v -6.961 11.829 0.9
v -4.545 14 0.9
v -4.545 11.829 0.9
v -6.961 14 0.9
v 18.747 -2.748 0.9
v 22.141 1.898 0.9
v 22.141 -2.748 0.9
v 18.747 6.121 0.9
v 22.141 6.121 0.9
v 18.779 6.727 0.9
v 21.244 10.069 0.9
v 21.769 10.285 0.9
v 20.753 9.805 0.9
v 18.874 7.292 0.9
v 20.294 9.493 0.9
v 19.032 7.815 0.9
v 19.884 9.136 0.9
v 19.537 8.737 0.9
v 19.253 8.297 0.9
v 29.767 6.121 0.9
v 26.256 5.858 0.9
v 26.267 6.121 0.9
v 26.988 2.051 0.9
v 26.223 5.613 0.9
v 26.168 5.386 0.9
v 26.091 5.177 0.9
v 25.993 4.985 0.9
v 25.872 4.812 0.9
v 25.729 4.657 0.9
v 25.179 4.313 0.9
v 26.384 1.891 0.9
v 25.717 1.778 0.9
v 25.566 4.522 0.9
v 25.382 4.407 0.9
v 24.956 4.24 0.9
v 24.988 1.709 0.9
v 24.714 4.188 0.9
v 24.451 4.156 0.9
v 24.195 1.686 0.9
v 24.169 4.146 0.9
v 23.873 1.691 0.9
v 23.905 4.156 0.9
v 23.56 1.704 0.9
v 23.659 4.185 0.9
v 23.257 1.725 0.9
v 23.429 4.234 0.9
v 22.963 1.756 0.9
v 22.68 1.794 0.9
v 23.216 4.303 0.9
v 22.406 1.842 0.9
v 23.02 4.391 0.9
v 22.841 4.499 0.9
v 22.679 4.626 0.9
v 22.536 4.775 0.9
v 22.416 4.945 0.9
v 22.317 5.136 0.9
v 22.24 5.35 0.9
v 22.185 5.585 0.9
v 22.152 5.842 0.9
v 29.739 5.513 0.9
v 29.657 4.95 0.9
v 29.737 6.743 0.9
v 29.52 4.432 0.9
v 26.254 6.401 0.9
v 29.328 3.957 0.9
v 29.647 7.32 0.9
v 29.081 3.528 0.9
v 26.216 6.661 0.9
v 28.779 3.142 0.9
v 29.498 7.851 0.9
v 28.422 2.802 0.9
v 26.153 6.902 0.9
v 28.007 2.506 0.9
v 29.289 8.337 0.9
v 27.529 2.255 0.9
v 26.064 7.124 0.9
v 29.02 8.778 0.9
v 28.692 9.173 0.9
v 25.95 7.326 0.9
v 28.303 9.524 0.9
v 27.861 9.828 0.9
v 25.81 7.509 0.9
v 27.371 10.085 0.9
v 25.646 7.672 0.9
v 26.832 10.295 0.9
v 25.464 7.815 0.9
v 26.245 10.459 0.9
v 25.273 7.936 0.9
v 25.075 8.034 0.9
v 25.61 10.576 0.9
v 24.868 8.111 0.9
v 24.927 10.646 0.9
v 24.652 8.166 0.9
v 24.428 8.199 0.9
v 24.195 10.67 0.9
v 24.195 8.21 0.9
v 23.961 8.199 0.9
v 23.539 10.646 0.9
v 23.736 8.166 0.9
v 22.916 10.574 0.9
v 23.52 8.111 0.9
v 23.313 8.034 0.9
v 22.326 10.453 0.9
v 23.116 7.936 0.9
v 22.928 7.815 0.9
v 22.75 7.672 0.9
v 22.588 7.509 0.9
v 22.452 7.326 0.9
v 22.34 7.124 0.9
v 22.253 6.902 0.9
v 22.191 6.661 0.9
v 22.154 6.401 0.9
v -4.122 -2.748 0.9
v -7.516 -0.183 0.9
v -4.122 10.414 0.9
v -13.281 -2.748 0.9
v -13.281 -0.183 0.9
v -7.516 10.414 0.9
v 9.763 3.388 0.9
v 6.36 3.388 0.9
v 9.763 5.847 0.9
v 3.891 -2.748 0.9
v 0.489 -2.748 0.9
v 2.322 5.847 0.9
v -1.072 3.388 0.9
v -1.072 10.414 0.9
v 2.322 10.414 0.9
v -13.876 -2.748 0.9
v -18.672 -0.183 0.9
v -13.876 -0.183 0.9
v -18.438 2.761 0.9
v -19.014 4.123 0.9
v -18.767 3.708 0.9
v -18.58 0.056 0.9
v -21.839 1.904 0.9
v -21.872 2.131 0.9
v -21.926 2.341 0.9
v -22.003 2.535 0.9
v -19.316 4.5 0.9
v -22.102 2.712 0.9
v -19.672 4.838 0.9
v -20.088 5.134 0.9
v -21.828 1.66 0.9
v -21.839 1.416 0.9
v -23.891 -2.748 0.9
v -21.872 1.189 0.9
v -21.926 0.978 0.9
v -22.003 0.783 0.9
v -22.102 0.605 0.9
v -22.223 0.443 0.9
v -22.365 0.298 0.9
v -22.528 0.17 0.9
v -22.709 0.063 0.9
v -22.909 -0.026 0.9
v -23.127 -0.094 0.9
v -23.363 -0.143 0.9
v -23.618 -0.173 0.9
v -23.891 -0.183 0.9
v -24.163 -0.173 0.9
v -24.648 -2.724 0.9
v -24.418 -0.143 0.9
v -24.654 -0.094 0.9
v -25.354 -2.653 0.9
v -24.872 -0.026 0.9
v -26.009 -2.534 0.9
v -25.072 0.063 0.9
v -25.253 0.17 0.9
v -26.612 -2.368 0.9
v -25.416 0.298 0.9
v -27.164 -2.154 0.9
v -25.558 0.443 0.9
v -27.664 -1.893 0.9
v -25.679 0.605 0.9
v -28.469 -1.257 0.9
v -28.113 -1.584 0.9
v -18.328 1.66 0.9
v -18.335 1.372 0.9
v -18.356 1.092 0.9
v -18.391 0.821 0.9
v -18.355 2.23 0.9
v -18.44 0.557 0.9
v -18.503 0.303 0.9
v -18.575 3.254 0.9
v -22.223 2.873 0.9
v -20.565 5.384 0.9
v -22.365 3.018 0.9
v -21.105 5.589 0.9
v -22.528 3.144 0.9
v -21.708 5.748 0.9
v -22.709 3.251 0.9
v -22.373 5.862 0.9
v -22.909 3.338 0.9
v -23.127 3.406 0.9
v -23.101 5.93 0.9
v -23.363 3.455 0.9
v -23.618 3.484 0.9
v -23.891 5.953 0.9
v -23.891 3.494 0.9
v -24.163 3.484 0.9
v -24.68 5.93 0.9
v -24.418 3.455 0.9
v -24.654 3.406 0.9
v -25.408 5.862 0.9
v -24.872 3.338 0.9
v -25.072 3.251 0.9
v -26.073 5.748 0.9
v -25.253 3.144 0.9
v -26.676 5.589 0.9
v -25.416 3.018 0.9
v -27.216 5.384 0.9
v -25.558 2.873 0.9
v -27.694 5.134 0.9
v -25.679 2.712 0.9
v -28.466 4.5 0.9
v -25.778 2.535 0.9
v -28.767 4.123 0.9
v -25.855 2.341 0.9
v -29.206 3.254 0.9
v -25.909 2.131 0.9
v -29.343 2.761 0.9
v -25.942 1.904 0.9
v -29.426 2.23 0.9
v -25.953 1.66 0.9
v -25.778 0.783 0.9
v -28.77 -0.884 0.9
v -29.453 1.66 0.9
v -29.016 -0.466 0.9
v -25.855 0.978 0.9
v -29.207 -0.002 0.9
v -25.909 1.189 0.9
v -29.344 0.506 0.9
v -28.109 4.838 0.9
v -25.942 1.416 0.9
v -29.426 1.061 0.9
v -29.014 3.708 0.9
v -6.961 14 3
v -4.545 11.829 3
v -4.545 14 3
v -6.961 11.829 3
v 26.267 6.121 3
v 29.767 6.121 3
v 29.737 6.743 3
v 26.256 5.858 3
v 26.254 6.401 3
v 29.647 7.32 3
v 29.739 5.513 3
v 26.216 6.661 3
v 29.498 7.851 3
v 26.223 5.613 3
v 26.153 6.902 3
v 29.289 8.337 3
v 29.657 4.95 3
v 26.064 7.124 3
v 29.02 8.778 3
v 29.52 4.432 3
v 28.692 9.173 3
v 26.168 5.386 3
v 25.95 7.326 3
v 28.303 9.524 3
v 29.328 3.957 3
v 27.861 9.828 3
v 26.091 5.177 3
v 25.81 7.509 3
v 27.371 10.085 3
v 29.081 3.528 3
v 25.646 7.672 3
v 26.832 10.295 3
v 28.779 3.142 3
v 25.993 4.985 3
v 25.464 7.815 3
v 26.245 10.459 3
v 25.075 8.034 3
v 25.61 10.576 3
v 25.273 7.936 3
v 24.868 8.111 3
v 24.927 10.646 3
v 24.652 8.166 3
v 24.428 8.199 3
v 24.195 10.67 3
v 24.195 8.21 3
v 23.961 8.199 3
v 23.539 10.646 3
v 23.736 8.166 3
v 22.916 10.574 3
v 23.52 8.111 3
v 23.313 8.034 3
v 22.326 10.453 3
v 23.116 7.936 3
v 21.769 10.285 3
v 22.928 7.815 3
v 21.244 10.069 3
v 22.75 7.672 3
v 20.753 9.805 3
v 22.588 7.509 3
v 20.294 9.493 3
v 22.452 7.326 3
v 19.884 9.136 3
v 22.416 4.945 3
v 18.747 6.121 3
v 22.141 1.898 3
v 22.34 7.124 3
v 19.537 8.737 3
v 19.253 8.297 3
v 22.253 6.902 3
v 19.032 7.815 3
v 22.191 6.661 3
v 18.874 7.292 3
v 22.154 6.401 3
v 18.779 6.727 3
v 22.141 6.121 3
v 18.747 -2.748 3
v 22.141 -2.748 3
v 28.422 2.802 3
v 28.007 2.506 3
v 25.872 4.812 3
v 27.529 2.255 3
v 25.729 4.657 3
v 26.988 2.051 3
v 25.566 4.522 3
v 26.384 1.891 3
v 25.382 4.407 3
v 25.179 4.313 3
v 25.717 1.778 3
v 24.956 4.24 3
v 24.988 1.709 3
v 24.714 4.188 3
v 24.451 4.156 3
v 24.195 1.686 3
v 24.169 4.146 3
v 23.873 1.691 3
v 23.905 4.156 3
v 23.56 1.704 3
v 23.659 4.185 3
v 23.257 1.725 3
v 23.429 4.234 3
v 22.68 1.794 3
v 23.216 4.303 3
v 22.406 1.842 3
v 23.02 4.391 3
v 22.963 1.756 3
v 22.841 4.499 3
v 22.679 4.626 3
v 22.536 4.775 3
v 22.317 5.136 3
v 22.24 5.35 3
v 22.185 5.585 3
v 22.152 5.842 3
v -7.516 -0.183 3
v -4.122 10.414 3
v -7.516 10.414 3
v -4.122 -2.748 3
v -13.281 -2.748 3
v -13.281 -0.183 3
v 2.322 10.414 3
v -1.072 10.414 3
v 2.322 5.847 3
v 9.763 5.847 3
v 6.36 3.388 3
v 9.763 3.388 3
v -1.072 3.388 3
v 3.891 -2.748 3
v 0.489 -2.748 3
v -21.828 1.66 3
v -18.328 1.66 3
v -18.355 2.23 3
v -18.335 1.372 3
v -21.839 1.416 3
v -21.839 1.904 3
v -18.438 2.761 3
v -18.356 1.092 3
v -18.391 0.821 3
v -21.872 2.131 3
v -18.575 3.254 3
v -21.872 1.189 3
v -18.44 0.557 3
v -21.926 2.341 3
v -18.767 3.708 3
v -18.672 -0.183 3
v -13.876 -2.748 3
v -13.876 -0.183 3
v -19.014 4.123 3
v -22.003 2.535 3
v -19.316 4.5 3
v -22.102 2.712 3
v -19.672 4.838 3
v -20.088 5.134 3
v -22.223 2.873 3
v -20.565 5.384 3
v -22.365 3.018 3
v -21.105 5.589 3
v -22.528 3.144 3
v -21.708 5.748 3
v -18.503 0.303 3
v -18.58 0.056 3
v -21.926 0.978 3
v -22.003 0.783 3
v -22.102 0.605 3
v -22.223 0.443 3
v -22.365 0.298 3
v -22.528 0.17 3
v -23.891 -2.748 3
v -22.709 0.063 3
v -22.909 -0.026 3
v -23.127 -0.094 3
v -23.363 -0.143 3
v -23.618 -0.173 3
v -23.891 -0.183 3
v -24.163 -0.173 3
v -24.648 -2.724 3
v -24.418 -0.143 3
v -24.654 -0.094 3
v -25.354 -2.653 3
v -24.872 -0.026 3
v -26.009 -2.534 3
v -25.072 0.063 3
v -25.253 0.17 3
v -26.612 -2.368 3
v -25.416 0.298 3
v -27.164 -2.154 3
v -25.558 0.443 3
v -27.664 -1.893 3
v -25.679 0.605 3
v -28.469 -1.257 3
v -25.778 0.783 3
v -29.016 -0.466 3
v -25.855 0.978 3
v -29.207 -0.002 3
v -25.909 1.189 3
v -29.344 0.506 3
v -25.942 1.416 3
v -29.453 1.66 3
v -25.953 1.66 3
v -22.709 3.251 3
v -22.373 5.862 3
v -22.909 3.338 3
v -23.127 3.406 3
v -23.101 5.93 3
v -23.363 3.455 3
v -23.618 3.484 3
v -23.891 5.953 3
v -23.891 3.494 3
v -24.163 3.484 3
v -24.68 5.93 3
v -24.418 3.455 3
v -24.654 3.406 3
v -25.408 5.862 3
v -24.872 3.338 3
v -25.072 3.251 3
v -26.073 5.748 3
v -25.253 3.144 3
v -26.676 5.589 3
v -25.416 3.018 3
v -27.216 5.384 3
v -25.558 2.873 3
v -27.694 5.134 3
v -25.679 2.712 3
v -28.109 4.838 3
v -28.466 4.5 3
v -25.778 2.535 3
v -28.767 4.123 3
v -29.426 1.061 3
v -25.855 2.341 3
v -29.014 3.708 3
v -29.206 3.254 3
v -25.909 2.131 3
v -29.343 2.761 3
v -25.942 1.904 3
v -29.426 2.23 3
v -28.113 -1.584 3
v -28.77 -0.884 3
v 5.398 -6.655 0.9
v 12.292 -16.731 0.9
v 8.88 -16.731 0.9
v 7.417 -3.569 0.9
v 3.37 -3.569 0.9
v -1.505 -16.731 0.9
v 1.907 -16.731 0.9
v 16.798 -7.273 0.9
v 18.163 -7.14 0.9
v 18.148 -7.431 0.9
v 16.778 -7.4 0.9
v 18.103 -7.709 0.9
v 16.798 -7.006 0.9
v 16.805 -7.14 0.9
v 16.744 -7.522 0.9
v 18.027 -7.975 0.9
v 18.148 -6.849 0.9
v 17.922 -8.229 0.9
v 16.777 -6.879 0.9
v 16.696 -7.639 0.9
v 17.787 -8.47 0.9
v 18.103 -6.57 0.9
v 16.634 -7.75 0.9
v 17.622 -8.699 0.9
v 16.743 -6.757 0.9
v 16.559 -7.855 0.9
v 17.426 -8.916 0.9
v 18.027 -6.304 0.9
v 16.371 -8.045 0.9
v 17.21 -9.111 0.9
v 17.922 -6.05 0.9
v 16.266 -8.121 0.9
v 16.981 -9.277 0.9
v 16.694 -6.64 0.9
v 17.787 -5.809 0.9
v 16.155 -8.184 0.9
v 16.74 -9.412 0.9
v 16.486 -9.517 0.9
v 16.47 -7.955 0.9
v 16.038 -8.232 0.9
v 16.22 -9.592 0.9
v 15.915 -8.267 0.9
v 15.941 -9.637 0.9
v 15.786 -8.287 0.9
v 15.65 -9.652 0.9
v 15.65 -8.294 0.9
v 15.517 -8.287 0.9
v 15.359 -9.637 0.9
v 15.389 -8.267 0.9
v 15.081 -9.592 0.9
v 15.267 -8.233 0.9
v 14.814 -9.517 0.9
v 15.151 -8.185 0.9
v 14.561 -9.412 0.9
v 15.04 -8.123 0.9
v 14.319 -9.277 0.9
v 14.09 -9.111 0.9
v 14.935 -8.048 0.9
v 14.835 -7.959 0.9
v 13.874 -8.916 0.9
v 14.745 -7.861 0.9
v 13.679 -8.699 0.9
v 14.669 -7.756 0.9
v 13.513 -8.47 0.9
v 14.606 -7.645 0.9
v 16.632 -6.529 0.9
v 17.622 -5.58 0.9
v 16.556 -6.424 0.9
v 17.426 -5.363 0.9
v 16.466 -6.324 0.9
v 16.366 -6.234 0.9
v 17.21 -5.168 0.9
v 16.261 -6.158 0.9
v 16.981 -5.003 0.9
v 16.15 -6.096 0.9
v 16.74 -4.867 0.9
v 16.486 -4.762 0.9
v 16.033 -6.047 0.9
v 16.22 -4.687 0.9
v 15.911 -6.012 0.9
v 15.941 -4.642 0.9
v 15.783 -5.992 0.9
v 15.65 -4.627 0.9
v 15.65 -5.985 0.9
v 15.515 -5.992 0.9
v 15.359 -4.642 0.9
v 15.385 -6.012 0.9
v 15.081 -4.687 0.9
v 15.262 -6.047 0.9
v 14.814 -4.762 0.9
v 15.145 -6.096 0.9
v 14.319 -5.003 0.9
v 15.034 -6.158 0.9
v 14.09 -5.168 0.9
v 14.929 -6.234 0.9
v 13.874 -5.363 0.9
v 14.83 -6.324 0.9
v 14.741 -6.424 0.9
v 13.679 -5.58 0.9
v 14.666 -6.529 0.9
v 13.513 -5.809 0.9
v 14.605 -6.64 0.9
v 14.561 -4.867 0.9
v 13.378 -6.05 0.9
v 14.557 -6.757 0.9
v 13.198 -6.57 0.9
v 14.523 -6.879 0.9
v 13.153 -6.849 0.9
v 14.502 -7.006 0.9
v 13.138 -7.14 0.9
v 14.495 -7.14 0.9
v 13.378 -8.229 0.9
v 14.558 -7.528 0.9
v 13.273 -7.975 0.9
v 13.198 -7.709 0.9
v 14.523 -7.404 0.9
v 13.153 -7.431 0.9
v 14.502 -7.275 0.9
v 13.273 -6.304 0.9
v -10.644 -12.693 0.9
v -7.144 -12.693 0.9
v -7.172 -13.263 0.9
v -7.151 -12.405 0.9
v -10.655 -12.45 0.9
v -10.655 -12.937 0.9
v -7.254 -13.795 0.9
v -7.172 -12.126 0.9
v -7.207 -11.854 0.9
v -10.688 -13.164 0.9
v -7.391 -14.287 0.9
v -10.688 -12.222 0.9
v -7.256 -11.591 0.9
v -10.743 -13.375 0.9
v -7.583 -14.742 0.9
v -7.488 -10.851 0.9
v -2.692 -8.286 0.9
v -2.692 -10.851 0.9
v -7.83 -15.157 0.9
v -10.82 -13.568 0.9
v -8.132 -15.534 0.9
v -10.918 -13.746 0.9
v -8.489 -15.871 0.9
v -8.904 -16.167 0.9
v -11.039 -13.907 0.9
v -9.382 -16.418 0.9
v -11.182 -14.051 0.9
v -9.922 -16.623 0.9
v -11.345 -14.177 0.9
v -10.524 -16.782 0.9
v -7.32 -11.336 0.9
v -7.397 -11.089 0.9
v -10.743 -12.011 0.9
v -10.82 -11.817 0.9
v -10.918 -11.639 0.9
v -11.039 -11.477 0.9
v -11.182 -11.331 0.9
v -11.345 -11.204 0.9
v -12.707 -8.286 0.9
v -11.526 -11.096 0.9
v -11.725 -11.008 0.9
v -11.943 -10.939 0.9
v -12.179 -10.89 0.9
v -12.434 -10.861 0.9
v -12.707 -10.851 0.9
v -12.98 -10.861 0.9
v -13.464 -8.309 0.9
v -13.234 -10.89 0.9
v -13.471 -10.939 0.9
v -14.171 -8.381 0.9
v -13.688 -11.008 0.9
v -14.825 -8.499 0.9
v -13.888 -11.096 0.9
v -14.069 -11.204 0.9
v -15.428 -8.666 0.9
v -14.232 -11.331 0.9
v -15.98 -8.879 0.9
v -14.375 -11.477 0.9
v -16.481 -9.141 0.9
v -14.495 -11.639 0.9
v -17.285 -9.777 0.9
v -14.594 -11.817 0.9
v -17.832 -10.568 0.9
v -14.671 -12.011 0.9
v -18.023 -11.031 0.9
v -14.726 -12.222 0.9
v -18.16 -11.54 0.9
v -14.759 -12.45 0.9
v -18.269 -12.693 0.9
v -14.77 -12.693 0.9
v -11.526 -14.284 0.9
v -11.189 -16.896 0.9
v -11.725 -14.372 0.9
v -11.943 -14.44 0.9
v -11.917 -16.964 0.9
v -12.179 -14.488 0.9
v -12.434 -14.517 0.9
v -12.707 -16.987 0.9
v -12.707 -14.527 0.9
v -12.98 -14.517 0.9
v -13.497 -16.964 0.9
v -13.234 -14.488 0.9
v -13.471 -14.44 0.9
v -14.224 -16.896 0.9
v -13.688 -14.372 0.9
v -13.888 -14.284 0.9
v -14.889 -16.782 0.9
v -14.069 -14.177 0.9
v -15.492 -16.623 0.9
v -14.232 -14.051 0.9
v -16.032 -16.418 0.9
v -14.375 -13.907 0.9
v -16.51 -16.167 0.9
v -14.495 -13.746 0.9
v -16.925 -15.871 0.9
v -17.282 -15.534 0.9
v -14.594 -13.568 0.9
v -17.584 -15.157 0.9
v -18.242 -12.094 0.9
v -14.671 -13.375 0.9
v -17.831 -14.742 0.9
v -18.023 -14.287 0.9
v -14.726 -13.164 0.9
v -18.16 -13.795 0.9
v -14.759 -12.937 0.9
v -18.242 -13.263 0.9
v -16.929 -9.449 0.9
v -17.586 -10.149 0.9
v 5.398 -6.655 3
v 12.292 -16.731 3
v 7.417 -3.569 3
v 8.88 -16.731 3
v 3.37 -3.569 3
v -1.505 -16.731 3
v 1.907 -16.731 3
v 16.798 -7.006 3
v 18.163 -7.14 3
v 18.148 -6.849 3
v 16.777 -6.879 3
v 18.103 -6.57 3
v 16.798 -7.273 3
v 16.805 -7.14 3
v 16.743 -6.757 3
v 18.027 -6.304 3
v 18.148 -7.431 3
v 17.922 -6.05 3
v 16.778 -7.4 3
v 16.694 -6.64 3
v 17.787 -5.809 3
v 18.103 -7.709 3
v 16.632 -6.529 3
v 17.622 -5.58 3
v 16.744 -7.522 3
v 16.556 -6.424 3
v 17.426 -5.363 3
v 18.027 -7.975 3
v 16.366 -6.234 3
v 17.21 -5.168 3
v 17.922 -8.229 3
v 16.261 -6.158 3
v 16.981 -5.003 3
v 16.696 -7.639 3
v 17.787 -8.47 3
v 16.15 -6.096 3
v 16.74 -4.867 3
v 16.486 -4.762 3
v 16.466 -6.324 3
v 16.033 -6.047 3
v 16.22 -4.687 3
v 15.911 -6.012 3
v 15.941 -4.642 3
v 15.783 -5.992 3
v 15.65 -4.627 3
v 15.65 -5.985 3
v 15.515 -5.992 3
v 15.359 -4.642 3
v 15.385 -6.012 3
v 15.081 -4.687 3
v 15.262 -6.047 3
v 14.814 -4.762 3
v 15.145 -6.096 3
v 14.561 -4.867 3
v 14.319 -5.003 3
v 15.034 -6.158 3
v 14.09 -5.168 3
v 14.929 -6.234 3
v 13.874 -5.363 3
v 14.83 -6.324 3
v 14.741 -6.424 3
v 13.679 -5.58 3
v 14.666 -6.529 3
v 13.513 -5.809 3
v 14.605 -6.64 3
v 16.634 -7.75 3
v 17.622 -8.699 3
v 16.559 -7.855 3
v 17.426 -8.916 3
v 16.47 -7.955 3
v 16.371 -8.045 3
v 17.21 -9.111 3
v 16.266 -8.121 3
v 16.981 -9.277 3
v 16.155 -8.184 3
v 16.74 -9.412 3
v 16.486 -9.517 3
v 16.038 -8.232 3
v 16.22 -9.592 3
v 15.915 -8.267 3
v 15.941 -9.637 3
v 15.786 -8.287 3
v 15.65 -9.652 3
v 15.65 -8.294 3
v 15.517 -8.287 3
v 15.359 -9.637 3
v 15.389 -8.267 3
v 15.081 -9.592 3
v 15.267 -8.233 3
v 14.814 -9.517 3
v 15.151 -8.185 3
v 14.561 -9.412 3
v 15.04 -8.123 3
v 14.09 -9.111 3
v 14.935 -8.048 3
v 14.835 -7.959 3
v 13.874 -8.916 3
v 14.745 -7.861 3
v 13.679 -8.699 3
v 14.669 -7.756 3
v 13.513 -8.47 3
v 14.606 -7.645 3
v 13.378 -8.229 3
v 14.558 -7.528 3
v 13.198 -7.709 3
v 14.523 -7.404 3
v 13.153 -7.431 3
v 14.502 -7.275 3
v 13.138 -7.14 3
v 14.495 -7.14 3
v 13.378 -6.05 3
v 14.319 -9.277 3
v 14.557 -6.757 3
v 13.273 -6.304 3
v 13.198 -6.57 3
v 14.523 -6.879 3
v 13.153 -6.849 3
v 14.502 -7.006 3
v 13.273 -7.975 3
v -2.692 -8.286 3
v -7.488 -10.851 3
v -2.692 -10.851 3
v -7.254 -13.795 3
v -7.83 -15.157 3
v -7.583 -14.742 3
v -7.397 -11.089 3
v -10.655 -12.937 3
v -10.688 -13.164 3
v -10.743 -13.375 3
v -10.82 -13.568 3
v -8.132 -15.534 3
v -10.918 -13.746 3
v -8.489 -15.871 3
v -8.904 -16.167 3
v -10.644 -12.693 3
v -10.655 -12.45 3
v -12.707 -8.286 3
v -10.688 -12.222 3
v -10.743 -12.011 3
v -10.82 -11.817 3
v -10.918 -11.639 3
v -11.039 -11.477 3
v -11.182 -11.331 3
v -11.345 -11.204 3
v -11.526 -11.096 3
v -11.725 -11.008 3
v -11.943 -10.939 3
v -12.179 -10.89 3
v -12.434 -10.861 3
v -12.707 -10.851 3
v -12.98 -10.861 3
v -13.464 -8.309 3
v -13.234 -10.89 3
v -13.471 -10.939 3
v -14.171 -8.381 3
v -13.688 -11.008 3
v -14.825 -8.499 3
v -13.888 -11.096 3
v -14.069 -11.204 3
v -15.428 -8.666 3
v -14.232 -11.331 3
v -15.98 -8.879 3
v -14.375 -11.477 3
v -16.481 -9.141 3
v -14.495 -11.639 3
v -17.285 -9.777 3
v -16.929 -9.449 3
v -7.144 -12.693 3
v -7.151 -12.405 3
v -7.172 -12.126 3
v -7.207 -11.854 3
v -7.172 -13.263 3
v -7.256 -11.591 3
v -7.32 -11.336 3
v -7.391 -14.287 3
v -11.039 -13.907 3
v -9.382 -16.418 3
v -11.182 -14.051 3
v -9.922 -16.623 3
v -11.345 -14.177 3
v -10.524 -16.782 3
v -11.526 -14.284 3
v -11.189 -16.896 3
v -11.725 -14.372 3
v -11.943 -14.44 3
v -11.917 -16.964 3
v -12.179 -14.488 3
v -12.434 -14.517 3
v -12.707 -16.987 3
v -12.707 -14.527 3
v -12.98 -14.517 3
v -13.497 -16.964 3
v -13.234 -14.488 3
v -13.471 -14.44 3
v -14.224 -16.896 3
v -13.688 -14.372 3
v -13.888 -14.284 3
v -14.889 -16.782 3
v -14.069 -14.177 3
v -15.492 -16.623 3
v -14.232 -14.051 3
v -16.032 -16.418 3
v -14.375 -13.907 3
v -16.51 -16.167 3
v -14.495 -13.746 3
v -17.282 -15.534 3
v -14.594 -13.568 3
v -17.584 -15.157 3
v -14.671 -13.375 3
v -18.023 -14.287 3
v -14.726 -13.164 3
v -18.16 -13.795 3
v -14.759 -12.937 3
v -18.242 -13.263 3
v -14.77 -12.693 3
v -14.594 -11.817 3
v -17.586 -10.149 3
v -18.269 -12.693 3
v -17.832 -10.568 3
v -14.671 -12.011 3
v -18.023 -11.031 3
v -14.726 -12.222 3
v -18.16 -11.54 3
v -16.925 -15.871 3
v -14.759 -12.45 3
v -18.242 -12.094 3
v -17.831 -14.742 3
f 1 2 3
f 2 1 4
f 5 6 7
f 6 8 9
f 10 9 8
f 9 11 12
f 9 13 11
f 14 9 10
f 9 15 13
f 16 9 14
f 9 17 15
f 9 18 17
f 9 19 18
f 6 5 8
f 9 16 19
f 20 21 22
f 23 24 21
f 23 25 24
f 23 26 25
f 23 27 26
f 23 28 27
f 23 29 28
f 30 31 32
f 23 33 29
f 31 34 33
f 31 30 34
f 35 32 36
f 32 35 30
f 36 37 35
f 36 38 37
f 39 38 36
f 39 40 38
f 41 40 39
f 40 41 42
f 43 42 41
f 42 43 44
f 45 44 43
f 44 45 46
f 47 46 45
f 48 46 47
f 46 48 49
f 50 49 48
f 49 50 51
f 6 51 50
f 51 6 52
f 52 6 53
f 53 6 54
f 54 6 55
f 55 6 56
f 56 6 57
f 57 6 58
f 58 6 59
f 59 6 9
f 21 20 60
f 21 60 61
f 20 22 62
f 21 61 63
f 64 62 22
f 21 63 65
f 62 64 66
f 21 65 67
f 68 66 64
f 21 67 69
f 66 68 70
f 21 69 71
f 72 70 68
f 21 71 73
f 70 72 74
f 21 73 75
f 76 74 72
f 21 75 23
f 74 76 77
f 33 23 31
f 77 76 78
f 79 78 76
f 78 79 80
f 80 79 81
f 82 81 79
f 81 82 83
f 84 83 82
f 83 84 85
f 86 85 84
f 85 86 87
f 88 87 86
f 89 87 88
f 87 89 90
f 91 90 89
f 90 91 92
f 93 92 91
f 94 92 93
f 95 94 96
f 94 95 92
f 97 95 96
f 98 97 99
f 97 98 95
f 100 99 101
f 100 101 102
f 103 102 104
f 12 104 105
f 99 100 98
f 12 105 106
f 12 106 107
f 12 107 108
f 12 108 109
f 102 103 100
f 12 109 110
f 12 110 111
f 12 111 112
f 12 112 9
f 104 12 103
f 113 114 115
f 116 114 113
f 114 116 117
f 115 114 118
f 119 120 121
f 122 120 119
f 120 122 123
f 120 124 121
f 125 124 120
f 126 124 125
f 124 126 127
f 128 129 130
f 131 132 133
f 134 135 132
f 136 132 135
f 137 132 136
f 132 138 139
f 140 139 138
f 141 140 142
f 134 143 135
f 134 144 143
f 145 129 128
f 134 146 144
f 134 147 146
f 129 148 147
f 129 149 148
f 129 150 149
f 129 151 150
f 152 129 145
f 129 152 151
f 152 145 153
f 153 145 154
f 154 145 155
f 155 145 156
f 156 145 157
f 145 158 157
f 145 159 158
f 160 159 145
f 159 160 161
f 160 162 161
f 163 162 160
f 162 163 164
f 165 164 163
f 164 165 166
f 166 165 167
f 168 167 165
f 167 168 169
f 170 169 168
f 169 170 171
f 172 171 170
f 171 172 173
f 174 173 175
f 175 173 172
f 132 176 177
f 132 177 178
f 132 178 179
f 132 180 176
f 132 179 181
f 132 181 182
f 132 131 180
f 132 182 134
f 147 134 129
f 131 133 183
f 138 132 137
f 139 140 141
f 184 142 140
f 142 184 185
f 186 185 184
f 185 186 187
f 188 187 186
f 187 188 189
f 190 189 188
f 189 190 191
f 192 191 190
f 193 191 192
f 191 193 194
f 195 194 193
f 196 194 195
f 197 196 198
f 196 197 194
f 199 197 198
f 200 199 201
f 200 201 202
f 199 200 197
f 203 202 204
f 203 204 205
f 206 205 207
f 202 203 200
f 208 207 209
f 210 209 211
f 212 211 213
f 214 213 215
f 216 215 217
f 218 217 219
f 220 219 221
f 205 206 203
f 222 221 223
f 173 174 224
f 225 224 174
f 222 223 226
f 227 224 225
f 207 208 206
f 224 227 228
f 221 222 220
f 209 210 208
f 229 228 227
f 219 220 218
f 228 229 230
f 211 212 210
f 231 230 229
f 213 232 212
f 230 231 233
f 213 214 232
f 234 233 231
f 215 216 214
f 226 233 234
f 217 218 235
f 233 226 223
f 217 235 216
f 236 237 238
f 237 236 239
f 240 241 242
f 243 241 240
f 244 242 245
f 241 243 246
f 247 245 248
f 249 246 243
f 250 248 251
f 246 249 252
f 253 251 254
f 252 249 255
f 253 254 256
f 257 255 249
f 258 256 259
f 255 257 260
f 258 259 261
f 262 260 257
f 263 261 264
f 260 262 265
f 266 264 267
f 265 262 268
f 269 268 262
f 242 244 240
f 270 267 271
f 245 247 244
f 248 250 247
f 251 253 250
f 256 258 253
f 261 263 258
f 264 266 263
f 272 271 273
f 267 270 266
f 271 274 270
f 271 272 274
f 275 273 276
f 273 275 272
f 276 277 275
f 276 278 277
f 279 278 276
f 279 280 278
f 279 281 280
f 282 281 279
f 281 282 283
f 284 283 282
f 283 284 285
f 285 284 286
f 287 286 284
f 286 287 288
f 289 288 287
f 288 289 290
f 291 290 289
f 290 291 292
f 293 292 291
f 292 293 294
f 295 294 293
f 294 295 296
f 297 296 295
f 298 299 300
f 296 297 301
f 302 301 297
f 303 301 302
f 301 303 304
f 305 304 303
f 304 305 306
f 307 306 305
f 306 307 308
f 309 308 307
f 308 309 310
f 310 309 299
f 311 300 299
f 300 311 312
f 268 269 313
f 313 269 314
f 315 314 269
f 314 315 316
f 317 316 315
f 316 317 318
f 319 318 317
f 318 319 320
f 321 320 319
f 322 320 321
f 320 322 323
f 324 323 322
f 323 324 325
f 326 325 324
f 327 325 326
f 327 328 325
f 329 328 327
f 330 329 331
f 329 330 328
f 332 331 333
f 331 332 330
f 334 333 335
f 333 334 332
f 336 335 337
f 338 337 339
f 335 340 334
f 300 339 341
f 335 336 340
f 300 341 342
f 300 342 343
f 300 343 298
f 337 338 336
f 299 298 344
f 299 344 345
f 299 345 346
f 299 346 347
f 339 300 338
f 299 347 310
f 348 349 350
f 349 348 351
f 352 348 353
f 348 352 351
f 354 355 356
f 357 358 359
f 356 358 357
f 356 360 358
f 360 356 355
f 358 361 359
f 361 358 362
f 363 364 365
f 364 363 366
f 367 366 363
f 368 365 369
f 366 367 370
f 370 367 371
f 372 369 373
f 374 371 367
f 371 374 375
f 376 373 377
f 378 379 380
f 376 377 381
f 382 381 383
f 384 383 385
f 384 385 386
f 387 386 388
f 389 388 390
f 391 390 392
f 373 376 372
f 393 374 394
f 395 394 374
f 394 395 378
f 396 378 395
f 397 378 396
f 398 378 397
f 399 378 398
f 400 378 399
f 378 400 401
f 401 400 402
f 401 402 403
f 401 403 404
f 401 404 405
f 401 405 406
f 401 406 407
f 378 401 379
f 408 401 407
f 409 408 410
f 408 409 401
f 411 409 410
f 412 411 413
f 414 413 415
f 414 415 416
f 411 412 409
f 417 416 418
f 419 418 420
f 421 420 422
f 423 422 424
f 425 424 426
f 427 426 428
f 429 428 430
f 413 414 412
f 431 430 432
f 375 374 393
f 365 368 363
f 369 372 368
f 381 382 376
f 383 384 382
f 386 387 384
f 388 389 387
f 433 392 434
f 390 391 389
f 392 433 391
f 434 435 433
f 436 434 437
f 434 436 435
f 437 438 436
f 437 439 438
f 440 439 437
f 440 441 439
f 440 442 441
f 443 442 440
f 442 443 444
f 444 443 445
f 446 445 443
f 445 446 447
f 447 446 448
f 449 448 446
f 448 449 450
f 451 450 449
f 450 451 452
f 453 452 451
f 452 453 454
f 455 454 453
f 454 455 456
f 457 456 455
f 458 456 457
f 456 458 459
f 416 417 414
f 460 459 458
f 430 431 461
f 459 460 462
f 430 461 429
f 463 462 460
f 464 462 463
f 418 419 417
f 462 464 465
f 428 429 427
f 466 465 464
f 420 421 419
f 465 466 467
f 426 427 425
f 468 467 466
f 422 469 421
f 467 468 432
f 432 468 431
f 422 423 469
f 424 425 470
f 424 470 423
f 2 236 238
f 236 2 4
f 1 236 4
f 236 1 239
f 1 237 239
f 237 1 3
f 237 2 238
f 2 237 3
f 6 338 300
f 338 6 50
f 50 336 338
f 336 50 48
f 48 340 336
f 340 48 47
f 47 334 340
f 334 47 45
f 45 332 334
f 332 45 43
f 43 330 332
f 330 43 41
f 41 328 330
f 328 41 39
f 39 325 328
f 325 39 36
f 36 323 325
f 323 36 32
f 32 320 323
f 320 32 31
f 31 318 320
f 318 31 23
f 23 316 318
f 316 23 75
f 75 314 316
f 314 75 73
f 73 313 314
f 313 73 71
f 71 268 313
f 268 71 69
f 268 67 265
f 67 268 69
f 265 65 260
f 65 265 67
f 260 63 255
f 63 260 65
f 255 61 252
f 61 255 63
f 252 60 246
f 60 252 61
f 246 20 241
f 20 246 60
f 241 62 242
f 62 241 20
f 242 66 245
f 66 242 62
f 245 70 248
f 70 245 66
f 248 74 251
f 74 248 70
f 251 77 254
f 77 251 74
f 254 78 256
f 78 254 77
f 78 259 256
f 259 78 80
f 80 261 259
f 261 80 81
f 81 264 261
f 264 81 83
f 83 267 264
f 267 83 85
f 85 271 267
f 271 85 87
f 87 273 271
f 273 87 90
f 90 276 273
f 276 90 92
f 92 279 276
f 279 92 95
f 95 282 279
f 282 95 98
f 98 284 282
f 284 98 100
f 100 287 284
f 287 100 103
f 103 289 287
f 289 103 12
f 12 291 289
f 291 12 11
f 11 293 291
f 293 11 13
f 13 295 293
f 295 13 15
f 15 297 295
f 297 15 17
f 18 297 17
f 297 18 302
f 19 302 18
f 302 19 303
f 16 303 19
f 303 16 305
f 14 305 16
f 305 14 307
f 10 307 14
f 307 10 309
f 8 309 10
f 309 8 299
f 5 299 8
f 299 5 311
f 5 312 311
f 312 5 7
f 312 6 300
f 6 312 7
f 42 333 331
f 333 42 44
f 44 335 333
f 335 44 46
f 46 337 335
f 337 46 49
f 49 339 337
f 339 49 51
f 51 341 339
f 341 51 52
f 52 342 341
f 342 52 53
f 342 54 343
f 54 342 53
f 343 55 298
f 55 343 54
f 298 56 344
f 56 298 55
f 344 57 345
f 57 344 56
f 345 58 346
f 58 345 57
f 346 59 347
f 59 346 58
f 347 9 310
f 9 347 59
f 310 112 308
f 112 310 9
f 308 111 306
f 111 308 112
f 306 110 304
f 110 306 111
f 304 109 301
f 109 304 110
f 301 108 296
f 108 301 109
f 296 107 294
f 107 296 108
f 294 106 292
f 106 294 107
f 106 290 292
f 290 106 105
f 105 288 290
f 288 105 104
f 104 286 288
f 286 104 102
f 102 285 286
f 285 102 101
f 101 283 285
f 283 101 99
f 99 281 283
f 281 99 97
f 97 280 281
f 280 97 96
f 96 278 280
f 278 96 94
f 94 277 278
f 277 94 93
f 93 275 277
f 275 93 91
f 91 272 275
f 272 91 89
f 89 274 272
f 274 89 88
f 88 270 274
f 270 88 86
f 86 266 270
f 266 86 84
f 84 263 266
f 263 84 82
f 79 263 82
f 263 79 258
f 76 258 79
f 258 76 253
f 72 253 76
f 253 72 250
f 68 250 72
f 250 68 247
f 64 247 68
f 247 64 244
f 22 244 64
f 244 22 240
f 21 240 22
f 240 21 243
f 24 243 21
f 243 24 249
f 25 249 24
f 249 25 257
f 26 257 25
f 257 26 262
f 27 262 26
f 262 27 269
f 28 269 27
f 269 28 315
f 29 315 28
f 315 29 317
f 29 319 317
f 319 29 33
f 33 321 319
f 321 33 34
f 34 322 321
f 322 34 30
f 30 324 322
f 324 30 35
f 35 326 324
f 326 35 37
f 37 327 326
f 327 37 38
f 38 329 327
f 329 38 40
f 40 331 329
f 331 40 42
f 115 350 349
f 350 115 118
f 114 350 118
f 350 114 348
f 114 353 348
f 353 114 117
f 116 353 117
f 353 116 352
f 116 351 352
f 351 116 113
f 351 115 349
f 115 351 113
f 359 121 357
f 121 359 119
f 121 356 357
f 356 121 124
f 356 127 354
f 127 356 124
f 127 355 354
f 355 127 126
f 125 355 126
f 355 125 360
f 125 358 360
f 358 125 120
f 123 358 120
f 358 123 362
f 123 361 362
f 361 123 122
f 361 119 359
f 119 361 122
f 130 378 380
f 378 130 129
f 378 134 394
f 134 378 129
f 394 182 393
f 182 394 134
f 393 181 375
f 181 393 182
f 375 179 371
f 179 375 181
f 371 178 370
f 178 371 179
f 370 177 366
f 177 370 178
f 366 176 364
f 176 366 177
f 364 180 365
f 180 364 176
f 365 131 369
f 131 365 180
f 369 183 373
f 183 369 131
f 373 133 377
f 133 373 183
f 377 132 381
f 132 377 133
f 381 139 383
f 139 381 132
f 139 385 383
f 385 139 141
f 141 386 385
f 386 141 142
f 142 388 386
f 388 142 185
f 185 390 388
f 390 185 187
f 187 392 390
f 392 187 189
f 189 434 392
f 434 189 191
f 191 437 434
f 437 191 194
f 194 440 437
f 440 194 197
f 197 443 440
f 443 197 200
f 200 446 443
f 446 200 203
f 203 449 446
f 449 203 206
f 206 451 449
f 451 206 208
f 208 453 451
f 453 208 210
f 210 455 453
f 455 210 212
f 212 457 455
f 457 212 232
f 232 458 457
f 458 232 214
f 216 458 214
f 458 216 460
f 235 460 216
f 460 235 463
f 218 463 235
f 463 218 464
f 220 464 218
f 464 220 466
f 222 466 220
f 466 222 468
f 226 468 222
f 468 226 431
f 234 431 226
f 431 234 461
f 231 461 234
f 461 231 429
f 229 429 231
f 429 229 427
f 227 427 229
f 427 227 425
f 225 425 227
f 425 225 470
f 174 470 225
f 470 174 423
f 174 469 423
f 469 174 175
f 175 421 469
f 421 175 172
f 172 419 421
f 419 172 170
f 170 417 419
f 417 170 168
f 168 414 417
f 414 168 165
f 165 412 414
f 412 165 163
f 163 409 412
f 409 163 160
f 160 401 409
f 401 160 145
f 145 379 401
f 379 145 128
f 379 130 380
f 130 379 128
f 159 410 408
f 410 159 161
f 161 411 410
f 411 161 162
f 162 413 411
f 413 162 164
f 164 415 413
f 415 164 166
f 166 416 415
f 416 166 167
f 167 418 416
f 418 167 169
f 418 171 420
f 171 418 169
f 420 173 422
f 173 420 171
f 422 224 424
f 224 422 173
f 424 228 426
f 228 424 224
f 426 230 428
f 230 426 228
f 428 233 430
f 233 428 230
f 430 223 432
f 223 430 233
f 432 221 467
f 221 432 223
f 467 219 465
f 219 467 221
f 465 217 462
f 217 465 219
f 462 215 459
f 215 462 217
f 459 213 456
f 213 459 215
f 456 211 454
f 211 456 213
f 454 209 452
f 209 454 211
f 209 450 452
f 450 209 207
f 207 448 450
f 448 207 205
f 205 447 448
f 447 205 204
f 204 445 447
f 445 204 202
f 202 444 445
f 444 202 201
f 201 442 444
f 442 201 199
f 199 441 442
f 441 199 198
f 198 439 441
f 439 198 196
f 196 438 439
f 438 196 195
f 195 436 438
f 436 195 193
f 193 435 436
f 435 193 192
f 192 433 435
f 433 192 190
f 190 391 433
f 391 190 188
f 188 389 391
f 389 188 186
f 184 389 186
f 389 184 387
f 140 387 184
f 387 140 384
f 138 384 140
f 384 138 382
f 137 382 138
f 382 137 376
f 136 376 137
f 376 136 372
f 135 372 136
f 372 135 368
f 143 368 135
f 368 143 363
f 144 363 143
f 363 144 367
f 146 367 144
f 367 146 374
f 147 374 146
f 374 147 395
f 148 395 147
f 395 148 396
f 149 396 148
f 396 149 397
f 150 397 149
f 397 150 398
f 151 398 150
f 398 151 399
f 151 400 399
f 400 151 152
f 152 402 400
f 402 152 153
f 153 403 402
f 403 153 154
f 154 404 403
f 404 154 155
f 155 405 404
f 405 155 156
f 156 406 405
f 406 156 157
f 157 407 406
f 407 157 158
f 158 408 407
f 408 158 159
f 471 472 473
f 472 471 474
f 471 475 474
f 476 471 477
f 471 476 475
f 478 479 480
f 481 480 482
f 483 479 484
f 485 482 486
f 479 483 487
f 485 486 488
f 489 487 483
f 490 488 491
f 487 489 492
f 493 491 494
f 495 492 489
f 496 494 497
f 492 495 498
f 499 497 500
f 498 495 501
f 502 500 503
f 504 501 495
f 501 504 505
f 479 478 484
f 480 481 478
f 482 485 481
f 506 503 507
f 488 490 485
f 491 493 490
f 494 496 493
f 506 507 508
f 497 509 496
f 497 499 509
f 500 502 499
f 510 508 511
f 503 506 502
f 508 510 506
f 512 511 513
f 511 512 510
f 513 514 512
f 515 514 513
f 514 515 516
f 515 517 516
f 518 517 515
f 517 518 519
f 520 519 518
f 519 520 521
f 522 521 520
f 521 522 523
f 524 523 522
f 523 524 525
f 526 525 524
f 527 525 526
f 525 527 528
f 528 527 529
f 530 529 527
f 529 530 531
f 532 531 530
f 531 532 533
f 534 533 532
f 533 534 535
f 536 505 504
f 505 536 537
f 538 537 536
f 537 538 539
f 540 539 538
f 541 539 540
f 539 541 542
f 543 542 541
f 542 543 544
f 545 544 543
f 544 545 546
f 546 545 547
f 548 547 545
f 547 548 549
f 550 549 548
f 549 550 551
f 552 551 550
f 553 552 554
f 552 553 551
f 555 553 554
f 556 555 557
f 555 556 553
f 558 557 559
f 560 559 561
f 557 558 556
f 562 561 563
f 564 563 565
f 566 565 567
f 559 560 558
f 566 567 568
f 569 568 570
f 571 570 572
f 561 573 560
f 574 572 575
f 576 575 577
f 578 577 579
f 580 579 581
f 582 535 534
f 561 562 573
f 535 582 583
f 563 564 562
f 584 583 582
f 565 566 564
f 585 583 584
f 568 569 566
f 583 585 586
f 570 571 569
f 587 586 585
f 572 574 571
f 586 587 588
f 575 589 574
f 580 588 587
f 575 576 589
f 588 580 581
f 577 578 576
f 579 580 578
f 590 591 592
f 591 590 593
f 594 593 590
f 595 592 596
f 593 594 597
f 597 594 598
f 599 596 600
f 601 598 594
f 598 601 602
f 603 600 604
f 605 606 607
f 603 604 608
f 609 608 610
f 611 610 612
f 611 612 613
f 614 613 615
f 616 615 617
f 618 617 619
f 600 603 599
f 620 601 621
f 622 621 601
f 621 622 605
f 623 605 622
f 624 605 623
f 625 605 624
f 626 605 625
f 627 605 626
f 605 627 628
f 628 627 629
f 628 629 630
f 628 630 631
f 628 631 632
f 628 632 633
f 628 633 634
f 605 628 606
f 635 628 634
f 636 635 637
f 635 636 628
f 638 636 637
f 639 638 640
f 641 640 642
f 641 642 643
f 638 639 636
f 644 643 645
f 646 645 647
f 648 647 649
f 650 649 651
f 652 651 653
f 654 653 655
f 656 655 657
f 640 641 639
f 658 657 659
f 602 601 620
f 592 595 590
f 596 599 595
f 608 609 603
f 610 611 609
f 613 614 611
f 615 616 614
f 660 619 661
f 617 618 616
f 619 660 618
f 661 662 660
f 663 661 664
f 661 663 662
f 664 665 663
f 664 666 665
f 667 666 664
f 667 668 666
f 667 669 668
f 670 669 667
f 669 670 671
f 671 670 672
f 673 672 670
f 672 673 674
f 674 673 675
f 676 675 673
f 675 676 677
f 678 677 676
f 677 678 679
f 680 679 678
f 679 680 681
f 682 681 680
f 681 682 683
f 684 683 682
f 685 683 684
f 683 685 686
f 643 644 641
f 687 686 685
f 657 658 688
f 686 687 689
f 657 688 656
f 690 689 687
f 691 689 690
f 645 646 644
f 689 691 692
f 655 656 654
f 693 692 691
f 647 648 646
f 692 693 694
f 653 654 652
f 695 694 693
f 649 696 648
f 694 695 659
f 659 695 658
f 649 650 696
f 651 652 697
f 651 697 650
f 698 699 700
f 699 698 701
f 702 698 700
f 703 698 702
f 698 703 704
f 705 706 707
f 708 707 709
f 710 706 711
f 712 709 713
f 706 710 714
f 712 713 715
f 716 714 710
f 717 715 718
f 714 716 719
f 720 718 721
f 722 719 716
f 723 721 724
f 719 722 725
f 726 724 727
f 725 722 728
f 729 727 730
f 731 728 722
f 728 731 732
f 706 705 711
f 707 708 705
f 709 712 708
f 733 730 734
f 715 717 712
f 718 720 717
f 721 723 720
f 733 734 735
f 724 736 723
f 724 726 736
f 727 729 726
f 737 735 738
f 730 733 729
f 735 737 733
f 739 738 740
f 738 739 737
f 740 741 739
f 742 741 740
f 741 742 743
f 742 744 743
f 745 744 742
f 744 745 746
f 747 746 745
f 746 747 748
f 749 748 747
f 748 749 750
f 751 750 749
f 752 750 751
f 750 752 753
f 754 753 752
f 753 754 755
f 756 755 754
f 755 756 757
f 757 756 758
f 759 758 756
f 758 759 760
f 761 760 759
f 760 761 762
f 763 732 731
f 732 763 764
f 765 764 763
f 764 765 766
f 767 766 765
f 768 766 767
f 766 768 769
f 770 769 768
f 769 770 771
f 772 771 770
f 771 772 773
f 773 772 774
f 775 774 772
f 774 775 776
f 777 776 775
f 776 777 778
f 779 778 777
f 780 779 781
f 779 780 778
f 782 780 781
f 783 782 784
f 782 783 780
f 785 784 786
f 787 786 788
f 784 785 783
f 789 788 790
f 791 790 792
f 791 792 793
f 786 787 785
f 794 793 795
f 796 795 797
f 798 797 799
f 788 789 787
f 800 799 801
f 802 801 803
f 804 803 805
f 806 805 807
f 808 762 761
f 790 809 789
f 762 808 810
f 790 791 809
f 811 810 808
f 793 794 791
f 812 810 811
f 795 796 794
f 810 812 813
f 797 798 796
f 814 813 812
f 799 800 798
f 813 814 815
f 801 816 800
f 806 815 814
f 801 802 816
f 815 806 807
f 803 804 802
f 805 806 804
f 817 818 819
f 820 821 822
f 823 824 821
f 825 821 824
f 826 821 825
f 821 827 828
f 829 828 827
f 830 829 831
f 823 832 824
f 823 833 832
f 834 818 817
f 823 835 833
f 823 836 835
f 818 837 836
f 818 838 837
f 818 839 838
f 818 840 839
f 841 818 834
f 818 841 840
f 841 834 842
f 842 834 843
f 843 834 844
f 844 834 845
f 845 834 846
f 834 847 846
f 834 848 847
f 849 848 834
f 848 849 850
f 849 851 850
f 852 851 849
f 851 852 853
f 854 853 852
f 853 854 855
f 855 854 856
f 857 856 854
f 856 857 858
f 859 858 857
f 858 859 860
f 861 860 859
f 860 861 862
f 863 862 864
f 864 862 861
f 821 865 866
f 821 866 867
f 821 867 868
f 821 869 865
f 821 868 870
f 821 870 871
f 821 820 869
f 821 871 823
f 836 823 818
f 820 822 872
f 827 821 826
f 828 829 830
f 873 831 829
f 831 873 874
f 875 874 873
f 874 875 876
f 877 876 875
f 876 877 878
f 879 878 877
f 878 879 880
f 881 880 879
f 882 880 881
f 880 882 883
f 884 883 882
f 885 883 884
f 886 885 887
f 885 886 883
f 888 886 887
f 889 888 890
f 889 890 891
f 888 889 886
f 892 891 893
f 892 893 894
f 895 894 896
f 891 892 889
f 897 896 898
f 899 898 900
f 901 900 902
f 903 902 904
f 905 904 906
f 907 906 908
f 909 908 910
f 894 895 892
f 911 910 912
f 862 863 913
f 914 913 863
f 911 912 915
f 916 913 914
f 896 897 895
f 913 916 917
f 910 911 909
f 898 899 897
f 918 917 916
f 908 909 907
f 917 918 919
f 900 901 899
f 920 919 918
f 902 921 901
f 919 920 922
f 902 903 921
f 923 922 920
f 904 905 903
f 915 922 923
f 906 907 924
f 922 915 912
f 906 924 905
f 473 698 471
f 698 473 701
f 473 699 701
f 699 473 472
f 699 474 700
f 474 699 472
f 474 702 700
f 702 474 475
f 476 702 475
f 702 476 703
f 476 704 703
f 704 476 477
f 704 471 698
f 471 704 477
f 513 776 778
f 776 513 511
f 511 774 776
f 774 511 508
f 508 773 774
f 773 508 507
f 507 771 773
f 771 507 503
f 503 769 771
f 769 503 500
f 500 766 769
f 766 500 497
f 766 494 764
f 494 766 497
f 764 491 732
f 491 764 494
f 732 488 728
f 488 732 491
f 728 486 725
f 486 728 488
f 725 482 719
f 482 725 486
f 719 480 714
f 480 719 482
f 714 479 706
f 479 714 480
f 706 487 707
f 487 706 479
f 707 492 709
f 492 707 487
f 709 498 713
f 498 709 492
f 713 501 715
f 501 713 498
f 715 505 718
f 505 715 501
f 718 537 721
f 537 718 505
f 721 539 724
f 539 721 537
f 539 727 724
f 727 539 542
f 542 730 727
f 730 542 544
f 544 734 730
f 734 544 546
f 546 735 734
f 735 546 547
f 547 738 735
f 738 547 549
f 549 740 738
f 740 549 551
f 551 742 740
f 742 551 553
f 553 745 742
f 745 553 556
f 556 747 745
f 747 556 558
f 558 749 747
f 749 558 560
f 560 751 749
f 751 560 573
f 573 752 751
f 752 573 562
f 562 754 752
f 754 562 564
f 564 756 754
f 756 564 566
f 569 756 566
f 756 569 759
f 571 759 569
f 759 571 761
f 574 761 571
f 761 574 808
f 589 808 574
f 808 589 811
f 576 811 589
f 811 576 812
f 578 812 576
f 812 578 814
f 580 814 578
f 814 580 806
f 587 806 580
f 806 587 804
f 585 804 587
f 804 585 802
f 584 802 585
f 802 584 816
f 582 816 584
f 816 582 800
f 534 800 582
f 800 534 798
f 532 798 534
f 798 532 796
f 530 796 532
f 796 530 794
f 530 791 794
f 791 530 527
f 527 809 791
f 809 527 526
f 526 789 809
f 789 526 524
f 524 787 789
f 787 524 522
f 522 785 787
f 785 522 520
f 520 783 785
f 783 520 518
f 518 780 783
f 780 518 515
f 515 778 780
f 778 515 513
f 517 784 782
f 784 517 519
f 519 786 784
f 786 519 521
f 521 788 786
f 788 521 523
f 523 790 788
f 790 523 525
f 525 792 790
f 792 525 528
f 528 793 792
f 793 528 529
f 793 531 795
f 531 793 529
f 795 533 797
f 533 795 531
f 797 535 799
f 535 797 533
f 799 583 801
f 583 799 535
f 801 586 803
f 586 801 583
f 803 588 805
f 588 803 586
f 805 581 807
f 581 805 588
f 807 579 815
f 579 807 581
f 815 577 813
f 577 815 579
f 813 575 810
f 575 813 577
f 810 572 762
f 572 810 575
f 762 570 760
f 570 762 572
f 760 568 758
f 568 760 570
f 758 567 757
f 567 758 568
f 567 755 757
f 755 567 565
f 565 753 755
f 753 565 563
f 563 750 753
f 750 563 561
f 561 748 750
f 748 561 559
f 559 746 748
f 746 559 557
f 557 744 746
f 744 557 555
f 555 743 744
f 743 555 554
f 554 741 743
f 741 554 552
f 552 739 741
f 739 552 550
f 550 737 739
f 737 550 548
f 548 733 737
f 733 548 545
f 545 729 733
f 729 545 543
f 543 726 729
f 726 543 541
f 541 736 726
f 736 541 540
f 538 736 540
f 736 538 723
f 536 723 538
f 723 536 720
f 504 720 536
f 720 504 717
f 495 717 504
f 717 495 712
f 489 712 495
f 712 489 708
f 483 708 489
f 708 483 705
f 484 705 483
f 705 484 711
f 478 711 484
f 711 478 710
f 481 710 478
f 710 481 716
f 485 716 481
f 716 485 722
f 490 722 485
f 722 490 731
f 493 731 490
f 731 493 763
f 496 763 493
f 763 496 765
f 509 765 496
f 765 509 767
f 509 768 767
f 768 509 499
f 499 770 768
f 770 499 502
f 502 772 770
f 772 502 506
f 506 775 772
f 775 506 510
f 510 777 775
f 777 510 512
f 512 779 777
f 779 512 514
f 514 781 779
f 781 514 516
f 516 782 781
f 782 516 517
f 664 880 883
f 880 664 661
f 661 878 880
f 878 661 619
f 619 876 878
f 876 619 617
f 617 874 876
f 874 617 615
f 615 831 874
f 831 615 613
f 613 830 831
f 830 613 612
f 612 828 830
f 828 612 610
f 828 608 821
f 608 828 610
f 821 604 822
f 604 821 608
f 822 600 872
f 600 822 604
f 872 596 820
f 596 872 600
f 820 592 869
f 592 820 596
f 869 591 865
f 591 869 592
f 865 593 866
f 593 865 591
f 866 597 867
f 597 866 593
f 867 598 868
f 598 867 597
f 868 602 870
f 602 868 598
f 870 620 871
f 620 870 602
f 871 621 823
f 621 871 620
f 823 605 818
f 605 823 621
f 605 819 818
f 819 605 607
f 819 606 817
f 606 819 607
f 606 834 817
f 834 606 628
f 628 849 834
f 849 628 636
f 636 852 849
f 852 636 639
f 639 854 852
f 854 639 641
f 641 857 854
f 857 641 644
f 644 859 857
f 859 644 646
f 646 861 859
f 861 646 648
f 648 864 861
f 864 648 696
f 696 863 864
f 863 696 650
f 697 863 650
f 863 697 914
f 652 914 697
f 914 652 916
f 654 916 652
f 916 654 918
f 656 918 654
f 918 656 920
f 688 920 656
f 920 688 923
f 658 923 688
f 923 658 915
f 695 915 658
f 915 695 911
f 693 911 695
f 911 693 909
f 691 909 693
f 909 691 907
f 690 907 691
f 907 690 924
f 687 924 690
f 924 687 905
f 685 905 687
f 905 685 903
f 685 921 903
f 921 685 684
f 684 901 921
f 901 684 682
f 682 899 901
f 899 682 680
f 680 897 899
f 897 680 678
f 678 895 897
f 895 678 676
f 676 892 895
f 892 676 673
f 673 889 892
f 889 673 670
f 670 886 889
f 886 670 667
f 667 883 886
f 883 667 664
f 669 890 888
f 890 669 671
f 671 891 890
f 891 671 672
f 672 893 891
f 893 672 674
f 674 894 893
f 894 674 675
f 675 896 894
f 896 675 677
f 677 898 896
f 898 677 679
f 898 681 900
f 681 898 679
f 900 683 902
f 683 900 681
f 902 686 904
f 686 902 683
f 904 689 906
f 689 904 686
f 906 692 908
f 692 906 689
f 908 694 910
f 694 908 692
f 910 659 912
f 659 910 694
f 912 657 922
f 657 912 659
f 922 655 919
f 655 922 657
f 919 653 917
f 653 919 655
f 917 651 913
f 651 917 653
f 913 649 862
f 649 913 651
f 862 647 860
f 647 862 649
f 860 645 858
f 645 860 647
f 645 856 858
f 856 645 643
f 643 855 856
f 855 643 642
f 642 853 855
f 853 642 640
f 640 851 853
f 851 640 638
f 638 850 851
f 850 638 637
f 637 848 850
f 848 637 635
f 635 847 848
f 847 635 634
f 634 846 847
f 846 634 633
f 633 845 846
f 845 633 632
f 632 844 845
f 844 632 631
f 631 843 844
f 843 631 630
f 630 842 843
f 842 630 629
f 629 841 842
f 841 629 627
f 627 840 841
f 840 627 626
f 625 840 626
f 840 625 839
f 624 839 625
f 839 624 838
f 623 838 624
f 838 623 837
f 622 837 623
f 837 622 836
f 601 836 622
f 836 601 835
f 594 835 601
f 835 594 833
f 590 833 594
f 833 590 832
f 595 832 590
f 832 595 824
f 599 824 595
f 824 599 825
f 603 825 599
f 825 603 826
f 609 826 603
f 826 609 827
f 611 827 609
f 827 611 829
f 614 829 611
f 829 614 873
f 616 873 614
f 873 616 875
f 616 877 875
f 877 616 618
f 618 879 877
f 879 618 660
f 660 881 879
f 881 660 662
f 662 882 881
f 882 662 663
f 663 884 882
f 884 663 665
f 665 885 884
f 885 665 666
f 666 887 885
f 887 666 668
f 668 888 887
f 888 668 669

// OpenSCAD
$fn = 48;
  // syllabics (overlaid on icon, tallest)
  translate([0, 5.430, 0.900]) linear_extrude(height=2.100) text("ᓇᒨᔭ ᑭ", size=13.000, halign="center", valign="center", font="Euphemia UCAS:style=Bold");
  translate([0, -10.430, 0.900]) linear_extrude(height=2.100) text("ᓂᐱᐤ", size=13.000, halign="center", valign="center", font="Euphemia UCAS:style=Bold");
